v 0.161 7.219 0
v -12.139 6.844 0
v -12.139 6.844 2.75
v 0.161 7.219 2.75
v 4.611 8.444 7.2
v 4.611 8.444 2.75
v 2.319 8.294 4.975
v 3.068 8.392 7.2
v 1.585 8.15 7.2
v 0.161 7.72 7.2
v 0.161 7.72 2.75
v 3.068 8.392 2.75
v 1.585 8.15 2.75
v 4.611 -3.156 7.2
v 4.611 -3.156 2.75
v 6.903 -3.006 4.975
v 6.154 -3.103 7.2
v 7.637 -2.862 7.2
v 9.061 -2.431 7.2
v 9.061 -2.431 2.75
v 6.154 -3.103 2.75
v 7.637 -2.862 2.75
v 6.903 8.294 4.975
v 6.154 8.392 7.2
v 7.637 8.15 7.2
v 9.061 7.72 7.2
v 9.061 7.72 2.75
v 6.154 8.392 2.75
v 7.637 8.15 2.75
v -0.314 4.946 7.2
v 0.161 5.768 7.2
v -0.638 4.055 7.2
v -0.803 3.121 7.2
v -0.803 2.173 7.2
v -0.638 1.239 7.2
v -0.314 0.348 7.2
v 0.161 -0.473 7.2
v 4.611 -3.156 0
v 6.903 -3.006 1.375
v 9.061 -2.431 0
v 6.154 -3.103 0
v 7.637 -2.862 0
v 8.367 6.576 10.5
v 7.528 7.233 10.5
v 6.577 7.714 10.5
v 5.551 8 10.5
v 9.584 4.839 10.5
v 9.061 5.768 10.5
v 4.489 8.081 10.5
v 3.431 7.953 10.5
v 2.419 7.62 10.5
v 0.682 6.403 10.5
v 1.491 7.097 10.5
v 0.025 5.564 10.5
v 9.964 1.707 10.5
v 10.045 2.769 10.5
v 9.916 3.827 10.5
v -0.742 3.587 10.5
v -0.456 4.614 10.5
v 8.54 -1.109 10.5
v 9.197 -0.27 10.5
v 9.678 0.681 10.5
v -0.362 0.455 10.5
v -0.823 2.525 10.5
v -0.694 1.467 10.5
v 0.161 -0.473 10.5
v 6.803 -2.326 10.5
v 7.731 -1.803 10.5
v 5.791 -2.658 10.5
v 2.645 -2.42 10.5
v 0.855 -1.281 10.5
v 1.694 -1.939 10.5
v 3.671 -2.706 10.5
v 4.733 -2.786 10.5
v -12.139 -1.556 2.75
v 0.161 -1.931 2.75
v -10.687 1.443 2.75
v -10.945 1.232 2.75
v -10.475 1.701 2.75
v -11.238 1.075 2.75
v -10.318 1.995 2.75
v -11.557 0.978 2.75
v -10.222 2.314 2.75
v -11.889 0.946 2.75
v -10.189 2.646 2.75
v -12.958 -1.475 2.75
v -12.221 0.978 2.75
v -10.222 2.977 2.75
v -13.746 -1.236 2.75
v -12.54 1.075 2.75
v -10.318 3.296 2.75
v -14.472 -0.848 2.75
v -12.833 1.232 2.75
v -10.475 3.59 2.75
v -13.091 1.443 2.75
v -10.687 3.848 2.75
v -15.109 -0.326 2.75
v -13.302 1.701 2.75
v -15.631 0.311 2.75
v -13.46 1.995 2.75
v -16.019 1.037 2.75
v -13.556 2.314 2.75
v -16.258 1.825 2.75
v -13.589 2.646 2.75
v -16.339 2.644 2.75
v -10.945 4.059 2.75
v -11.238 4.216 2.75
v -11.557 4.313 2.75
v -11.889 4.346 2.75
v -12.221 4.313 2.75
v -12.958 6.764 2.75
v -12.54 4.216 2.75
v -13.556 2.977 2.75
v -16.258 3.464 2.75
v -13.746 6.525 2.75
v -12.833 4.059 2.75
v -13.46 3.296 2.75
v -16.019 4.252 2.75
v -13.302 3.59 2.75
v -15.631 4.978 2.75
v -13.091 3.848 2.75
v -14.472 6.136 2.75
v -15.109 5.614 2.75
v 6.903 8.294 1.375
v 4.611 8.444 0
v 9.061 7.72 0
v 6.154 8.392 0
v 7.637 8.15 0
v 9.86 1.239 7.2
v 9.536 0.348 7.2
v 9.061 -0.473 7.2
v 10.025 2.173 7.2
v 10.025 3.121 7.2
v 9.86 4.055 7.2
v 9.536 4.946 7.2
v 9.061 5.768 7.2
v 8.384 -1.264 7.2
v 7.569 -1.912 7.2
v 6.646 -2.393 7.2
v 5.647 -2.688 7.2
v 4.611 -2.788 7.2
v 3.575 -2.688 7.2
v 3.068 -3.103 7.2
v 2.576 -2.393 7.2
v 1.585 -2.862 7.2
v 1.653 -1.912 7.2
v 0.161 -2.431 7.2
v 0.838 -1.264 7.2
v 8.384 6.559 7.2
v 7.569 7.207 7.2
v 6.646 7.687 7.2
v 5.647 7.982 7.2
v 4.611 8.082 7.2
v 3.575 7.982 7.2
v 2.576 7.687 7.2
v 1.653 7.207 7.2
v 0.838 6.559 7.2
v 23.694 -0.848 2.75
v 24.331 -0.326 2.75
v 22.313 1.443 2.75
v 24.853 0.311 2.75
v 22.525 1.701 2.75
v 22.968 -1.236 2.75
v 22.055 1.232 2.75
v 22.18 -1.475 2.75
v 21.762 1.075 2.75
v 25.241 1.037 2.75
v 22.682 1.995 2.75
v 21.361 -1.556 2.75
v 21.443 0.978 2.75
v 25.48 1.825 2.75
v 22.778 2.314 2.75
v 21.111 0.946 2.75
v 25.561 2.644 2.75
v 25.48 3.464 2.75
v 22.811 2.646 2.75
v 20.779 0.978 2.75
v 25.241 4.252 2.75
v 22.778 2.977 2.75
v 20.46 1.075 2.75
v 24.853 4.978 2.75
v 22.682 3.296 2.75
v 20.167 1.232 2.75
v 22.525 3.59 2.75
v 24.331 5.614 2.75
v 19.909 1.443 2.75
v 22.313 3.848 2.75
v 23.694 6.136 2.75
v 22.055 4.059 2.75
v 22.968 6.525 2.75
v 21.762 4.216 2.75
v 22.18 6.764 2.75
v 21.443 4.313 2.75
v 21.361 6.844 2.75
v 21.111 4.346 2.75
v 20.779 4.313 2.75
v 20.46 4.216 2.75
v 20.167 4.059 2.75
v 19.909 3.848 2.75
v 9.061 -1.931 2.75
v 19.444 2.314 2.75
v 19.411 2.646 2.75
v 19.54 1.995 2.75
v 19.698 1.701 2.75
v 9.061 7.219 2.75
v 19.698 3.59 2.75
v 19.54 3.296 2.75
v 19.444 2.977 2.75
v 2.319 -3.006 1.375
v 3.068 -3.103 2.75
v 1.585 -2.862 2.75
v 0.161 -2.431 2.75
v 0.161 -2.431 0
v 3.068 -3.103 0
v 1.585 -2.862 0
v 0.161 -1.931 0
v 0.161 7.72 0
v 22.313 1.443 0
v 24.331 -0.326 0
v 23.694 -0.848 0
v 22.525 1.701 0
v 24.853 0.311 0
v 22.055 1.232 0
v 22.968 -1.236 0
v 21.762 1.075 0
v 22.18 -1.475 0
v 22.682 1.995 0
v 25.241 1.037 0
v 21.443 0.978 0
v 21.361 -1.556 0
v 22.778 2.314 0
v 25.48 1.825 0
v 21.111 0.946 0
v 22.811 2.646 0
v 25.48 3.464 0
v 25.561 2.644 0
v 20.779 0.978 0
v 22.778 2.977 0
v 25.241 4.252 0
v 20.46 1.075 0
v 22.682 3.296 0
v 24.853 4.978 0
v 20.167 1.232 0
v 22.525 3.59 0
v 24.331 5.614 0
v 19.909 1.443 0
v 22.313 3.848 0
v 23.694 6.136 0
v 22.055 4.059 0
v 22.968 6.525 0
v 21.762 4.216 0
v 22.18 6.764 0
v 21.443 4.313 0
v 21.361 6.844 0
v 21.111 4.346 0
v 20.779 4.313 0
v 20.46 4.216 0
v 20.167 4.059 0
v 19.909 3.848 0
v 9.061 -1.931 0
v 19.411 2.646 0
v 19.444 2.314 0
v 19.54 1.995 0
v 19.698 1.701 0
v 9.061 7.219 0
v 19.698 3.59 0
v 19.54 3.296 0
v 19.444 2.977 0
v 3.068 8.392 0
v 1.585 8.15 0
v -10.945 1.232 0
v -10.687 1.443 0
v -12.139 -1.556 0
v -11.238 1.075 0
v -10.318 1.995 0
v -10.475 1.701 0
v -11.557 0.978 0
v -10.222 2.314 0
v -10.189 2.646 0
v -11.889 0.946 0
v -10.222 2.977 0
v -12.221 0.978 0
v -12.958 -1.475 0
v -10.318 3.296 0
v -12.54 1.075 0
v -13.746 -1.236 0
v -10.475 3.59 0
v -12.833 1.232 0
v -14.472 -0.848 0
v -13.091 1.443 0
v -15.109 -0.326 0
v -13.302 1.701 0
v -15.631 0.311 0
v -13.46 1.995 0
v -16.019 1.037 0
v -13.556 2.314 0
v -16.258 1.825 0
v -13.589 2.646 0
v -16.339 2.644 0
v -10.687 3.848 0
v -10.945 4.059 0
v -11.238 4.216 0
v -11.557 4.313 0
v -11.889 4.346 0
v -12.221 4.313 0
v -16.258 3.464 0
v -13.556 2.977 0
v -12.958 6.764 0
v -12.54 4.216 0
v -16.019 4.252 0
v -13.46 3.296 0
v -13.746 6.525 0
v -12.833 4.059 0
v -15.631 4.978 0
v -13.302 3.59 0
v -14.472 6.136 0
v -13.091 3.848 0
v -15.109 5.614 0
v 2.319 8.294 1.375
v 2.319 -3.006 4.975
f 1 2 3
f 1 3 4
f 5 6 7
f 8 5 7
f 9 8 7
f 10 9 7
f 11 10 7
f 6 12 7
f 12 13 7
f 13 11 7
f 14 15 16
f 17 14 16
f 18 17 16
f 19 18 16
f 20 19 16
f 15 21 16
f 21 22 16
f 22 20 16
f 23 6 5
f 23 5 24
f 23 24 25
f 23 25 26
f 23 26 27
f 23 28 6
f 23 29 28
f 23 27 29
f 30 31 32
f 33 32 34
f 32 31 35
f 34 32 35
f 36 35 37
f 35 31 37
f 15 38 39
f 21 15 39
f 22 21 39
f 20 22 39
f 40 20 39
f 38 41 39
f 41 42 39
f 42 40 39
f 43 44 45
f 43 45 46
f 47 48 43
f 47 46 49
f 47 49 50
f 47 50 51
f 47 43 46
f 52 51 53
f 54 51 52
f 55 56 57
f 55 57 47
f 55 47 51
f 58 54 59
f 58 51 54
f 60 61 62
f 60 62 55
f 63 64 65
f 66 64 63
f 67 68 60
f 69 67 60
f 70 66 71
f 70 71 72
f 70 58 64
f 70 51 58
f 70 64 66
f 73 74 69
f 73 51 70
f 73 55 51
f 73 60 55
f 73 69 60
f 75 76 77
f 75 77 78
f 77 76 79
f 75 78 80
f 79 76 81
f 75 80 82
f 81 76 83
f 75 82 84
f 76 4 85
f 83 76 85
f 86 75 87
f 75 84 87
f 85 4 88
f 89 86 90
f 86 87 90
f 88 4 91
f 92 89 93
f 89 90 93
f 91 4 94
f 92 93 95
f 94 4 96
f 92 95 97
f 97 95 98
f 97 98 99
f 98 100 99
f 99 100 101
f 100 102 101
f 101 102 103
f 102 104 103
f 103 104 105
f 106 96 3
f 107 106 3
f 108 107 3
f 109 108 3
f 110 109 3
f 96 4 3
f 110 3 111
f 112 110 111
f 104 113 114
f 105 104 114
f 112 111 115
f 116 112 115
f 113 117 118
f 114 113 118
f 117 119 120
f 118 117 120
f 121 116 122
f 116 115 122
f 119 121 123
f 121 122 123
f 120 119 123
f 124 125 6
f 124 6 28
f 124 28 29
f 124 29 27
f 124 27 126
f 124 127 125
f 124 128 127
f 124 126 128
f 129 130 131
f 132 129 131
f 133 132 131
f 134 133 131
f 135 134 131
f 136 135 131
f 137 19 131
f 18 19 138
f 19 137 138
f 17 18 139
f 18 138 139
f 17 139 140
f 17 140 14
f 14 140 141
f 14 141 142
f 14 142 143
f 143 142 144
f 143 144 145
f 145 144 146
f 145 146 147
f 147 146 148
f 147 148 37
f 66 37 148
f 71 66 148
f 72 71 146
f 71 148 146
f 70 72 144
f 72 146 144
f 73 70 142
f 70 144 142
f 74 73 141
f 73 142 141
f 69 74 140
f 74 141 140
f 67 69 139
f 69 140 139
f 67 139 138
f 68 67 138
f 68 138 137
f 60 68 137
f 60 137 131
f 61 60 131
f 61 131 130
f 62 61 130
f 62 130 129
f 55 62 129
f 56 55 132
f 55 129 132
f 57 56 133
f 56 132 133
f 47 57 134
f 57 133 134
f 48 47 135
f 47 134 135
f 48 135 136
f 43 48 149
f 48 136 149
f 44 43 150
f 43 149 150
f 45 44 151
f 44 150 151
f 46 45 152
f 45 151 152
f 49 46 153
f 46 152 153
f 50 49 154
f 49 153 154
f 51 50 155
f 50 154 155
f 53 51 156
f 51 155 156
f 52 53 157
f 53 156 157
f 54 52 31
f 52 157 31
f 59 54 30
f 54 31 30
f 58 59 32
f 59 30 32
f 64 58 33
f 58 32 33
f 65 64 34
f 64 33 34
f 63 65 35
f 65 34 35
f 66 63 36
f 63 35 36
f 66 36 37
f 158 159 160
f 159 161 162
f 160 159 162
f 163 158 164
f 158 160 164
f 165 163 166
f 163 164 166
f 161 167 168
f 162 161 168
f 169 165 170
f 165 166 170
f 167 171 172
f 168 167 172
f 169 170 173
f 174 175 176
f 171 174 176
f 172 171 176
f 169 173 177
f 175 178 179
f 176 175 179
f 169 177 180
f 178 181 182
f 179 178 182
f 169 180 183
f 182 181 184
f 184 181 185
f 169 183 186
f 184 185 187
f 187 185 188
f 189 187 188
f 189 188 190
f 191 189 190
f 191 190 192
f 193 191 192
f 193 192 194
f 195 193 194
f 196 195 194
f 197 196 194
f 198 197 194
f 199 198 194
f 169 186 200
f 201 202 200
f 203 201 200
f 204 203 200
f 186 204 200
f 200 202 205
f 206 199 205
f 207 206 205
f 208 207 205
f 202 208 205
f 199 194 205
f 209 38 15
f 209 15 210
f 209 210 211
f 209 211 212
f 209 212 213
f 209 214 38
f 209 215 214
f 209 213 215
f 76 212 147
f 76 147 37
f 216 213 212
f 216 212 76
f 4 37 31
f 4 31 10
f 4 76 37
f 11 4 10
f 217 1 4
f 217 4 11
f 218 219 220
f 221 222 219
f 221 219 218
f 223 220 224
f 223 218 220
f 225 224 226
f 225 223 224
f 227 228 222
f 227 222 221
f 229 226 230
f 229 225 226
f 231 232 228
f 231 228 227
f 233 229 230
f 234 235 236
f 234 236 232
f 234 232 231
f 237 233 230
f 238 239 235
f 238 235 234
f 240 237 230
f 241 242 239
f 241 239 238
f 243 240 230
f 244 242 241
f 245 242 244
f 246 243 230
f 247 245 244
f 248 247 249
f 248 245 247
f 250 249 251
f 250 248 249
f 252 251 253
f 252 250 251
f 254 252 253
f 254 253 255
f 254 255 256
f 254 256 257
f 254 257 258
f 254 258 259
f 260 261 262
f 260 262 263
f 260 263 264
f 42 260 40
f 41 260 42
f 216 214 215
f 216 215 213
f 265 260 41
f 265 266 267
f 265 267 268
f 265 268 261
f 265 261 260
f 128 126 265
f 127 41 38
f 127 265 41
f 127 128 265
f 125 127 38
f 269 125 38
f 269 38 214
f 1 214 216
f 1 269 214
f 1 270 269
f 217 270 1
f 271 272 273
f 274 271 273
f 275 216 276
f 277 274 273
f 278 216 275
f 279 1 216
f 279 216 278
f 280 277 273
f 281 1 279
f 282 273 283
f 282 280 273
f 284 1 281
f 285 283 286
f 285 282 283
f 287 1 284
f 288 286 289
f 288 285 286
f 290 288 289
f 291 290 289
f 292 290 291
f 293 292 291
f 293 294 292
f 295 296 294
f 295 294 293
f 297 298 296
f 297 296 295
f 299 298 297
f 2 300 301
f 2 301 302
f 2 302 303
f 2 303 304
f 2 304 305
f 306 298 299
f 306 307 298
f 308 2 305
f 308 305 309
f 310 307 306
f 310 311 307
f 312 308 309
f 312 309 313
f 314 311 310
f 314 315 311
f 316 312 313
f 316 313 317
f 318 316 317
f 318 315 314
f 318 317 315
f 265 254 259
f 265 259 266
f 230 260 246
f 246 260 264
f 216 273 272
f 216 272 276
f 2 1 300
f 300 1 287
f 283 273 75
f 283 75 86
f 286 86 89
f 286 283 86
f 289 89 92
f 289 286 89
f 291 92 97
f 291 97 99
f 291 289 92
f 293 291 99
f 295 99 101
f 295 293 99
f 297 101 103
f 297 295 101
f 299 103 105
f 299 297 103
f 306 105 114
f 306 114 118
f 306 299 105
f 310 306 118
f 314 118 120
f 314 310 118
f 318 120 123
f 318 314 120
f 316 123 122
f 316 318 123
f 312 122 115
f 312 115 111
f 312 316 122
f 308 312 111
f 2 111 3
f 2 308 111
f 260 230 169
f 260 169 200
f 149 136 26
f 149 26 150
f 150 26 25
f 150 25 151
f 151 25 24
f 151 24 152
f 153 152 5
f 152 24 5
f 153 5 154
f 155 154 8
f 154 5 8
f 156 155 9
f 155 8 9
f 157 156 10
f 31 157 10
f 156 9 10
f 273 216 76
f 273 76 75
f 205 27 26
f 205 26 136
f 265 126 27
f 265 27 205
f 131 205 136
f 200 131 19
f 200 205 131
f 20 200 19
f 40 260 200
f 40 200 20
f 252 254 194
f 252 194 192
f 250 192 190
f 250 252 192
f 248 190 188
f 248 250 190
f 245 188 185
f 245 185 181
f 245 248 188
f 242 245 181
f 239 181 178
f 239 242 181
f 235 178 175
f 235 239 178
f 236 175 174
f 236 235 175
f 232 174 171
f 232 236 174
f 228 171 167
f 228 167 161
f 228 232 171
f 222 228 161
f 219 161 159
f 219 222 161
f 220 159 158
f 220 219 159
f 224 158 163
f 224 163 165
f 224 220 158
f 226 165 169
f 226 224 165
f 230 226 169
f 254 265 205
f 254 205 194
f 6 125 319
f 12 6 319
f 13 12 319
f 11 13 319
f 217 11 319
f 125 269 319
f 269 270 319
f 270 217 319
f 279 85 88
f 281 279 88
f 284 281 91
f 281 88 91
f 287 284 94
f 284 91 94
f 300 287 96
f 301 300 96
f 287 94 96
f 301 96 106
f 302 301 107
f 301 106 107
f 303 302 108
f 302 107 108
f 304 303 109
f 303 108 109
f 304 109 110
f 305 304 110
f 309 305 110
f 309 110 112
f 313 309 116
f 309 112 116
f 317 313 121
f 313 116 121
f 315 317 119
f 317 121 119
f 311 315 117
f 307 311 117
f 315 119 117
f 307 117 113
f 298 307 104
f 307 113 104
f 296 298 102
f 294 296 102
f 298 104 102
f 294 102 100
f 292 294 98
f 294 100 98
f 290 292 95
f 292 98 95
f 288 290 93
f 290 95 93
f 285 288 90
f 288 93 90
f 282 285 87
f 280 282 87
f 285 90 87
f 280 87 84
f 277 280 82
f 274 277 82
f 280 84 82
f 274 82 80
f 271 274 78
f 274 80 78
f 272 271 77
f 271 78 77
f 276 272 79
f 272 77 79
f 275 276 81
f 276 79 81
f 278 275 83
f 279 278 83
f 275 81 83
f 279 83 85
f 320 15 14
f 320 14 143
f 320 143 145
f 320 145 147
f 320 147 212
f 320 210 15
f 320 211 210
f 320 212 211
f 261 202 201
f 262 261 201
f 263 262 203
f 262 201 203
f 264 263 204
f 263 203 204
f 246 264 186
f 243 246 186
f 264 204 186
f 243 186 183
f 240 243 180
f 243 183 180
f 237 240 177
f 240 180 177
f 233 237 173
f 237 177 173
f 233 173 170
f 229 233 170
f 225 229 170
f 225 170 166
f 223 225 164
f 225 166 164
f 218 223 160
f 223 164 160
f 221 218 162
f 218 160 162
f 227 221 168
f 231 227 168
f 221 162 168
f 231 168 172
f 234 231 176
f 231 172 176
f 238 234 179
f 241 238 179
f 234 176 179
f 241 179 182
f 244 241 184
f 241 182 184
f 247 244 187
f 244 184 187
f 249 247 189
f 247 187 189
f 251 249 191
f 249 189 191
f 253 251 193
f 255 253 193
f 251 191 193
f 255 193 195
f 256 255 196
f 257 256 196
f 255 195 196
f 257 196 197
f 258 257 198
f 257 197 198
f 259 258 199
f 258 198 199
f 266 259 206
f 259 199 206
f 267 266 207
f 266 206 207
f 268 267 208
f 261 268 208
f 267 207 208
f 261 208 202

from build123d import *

# Parameters (mm, degrees)
BOSS_EXTRUDE1_DEPTH = 2.75
SKETCH3_R           = 1.7
CUT_EXTRUDE1_DEPTH  = 2.75
BOSS_EXTRUDE2_DEPTH = 4.45
SKETCH6_R           = 5.435
BOSS_EXTRUDE3_DEPTH = 3.3


with BuildPart() as part:
    # Sketch2 → Boss-Extrude1 (new body)
    with BuildSketch(Plane.XY):
        with BuildLine():
            add(Edge.make_bspline(
                [(4.61101002, 8.44423368), (6.970103918, 8.506940606), (9.06101002, 7.719664696)],
                knots=[0, 0, 0, 0.687711527, 0.687711527, 0.687711527], degree=2))
            Line((9.06101002, 7.719664696), (9.06101002, 7.219432127))
            Line((9.06101002, 7.219432127), (21.36101002, 6.84423368))
            ThreePointArc((21.36101002, 6.84423368), (25.56101002, 2.64423368), (21.36101002, -1.55576632))
            Line((21.36101002, -1.55576632), (9.06101002, -1.930964768))
            Line((9.06101002, -1.930964768), (9.06101002, -2.431197337))
            add(Edge.make_bspline(
                [(4.61101002, -3.15576632), (6.970103918, -3.218473247), (9.06101002, -2.431197337)],
                knots=[0, 0, 0, 0.687711527, 0.687711527, 0.687711527], degree=2))
            add(Edge.make_bspline(
                [(4.61101002, -3.15576632), (2.251916122, -3.218473247), (0.16101002, -2.431197337)],
                knots=[0, 0, 0, 0.687711527, 0.687711527, 0.687711527], degree=2))
            Line((0.16101002, -2.431197337), (0.16101002, -1.930964768))
            Line((0.16101002, -1.930964768), (-12.13898998, -1.55576632))
            ThreePointArc((-12.13898998, -1.55576632), (-16.33898998, 2.64423368), (-12.13898998, 6.84423368))
            Line((-12.13898998, 6.84423368), (0.16101002, 7.219432127))
            Line((0.16101002, 7.219432127), (0.16101002, 7.719664696))
            add(Edge.make_bspline(
                [(4.61101002, 8.44423368), (2.251916122, 8.506940606), (0.16101002, 7.719664696)],
                knots=[0, 0, 0, 0.687711527, 0.687711527, 0.687711527], degree=2))
        make_face()
    extrude(amount=BOSS_EXTRUDE1_DEPTH)

    # Sketch3 → Cut-Extrude1 (cut)
    with BuildSketch(Plane.XY.offset(2.75)):
        with Locations((-11.88898998, 2.645532794)):
            Circle(SKETCH3_R)
        with Locations(Location((21.11101002, 2.645532794, 0), (0, 0, 180))):
            Circle(SKETCH3_R)
    extrude(amount=-CUT_EXTRUDE1_DEPTH, mode=Mode.SUBTRACT)

    # Sketch5 → Boss-Extrude2 (add)
    with BuildSketch(Plane.XY.offset(2.75)):
        with BuildLine():
            Line((9.06101002, 7.719664696), (9.06101002, 7.219432127))
            Line((9.06101002, 7.219432127), (9.06101002, -1.930964768))
            Line((9.06101002, -1.930964768), (9.06101002, -2.431197337))
            add(Edge.make_bspline(
                [(4.61101002, -3.15576632), (6.970103918, -3.218473247), (9.06101002, -2.431197337)],
                knots=[0, 0, 0, 1, 1, 1], degree=2))
            add(Edge.make_bspline(
                [(4.61101002, -3.15576632), (2.251916122, -3.218473247), (0.16101002, -2.431197337)],
                knots=[0, 0, 0, 1, 1, 1], degree=2))
            Line((0.16101002, -2.431197337), (0.16101002, -1.930964768))
            Line((0.16101002, -1.930964768), (0.16101002, 7.219432127))
            Line((0.16101002, 7.219432127), (0.16101002, 7.719664696))
            add(Edge.make_bspline(
                [(4.61101002, 8.44423368), (2.251916122, 8.506940606), (0.16101002, 7.719664696)],
                knots=[0, 0, 0, 1, 1, 1], degree=2))
            add(Edge.make_bspline(
                [(4.61101002, 8.44423368), (6.970103918, 8.506940606), (9.06101002, 7.719664696)],
                knots=[0, 0, 0, 1, 1, 1], degree=2))
        make_face()
    extrude(amount=BOSS_EXTRUDE2_DEPTH)

    # Sketch6 → Boss-Extrude3 (add)
    with BuildSketch(Plane.XY.offset(7.2)):
        with Locations(Location((4.611010009, 2.647143575, 0), (0, 0, 215.038419813))):
            Circle(SKETCH6_R)
    extrude(amount=BOSS_EXTRUDE3_DEPTH)


solid = part.part
